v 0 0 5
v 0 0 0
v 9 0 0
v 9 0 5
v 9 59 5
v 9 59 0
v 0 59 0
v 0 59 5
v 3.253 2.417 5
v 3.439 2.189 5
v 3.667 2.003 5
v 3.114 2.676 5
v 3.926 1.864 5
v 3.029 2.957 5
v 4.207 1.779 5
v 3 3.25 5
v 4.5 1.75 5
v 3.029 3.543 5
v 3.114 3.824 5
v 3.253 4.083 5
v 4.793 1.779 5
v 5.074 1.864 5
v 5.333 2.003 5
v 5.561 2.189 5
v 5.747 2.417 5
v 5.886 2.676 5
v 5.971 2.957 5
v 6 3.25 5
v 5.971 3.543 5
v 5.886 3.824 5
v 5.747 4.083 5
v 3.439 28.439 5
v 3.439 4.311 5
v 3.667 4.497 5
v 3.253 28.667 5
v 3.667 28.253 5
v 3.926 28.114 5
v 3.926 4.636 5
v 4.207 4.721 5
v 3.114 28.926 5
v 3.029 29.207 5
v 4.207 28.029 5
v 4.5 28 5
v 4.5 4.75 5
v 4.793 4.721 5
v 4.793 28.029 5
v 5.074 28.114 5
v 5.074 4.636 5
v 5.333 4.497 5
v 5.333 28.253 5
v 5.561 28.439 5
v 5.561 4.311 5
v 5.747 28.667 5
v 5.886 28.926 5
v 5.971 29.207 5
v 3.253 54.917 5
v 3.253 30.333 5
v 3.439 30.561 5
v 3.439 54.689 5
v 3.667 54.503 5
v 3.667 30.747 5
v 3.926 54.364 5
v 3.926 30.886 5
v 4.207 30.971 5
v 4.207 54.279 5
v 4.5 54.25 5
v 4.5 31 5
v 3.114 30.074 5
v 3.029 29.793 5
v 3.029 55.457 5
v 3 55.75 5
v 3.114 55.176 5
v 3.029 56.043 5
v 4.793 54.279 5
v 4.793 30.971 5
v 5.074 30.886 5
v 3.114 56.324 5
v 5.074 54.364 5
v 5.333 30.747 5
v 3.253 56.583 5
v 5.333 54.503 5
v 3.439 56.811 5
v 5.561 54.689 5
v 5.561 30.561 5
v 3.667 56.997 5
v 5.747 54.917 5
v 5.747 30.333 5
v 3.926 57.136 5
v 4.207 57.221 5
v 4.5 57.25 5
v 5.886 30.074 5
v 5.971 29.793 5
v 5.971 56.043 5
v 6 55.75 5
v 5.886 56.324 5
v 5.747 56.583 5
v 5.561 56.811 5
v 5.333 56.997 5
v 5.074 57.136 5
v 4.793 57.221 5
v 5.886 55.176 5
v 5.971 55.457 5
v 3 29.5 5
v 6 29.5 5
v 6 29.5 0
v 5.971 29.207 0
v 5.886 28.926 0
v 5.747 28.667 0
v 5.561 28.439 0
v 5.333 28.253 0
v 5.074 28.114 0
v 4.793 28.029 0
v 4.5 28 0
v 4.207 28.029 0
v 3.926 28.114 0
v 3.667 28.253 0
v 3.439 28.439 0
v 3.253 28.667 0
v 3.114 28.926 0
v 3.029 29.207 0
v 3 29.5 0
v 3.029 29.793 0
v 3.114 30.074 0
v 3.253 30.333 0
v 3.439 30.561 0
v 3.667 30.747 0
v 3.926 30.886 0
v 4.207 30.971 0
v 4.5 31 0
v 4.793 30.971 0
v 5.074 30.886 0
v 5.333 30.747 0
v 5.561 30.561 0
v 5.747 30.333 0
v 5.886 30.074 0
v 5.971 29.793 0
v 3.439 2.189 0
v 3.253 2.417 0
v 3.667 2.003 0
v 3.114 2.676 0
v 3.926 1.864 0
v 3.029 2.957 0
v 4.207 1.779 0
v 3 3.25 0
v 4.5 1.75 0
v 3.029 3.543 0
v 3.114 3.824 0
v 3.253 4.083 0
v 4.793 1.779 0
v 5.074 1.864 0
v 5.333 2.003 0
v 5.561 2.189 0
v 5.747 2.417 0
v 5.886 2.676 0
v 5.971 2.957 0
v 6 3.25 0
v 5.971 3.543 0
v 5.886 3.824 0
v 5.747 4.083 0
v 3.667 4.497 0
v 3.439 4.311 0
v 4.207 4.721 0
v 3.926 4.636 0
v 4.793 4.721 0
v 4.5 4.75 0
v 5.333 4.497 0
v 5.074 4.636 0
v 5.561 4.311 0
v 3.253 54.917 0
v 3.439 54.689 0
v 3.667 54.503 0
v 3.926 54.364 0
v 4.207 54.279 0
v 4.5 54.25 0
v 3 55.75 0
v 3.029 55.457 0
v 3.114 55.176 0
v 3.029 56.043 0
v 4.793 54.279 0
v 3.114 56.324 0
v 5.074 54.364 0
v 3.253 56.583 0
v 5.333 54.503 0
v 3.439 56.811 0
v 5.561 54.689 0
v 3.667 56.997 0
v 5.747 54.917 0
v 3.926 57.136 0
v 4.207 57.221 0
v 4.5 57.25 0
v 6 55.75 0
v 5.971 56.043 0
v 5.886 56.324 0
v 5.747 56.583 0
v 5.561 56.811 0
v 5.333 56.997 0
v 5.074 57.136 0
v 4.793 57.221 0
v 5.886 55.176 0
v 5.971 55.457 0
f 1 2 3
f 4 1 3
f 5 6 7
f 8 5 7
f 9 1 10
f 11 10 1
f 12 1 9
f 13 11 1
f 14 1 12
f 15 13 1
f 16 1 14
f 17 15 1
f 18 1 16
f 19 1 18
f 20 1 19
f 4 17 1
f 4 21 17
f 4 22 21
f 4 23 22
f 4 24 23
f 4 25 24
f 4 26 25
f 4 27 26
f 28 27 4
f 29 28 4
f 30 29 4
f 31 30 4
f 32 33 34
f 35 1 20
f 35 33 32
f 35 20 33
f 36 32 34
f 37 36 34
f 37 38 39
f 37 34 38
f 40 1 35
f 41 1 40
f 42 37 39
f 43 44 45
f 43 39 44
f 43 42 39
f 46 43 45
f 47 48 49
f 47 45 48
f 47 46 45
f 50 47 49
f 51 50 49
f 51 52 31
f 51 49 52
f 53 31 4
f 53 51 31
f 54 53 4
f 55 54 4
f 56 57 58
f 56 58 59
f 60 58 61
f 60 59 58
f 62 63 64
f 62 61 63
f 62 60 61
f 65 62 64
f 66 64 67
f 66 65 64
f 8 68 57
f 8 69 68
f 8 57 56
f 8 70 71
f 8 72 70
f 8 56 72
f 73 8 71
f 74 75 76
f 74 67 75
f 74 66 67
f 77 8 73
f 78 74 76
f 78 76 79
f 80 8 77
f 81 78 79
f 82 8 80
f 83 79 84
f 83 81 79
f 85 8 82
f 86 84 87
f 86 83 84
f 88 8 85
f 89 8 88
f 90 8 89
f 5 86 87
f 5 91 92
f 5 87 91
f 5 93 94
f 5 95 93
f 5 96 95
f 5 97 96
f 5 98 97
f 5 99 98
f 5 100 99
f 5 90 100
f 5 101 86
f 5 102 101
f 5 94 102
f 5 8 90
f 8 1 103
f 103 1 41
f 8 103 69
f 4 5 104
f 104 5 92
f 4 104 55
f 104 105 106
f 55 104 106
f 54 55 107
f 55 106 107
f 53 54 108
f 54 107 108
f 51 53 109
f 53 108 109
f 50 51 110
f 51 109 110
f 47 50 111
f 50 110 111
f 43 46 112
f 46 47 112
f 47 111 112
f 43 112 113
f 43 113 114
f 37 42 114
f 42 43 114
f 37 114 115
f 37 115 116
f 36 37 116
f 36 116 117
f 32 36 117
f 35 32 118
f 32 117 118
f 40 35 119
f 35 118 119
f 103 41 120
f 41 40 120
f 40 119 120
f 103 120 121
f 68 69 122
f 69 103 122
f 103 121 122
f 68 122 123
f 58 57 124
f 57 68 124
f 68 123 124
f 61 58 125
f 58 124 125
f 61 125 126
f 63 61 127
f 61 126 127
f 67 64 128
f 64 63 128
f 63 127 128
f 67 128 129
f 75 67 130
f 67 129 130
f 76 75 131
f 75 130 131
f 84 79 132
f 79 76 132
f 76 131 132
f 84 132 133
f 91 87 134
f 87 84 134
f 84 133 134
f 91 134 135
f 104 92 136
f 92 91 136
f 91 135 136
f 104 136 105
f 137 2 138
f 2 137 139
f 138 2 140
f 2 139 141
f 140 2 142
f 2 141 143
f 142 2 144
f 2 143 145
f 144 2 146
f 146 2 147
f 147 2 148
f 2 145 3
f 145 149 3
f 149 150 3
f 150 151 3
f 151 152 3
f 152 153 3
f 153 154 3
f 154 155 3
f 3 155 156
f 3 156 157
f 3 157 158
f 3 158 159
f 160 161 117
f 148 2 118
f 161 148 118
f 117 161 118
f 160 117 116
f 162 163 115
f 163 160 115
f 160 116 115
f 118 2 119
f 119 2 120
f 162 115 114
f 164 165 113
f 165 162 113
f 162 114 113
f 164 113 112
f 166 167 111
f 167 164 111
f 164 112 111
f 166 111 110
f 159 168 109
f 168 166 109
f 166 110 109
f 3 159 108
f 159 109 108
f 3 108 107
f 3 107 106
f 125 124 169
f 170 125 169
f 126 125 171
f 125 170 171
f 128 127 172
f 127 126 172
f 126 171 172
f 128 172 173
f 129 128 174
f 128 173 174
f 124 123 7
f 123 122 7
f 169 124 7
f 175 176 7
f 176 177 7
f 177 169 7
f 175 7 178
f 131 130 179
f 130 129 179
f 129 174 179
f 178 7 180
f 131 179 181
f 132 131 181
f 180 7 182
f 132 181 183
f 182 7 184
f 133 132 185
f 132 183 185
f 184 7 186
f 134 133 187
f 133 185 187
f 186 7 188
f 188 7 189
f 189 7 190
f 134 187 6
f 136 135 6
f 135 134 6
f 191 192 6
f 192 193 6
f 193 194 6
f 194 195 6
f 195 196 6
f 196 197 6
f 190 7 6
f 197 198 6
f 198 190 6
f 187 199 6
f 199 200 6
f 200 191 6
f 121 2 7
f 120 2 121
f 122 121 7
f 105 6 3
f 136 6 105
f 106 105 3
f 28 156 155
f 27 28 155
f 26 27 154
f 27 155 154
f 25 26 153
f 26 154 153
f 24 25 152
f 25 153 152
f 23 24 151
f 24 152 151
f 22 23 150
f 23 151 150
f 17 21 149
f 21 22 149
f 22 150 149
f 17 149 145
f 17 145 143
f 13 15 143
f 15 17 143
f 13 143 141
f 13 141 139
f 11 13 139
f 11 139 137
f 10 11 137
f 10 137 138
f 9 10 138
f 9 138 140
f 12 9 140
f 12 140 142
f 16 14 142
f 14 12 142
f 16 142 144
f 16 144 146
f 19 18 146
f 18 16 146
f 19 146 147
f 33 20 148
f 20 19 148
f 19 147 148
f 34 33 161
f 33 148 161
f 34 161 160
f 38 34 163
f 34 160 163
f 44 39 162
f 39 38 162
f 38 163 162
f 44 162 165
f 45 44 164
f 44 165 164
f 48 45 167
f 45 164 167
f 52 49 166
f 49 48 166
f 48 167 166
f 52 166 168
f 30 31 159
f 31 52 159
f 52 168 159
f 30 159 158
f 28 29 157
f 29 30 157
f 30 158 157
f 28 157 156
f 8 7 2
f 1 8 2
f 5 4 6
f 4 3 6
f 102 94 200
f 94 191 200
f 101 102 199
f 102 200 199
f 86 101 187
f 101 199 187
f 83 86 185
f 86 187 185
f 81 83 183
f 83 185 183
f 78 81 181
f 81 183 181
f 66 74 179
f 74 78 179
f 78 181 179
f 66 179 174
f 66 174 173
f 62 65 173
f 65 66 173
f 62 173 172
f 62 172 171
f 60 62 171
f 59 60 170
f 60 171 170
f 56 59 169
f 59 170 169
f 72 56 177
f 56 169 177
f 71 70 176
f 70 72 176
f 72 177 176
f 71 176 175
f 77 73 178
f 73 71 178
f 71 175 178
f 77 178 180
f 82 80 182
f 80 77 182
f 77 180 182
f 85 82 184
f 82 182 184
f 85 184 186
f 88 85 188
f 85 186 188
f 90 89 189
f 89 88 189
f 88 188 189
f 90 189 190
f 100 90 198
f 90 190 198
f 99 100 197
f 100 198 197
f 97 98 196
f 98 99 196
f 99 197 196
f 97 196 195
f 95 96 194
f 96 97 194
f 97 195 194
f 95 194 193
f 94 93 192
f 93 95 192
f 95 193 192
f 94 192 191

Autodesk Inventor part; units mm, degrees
ref_plane "YZ Plane" through (0, 0, 0) normal (1, 0, 0) x (0, 1, 0)
ref_plane "XZ Plane" through (0, 0, 0) normal (0, 1, 0) x (-1, 0, 0)
ref_plane "XY Plane" through (0, 0, 0) normal (0, 0, 1) x (1, 0, 0)
sketch "Sketch1" plane through (0, 0, 0) normal (0, 0, 1) x (1, 0, 0)
  line L0 (0, 0) -> (9, 0)
  line L1 (9, 0) -> (9, 59)
  line L2 (9, 59) -> (0, 59)
  line L3 (0, 59) -> (0, 0)
  circle A0 centre (4.5, 55.75) radius 1.5
  circle A1 centre (4.5, 3.25) radius 1.5
  line L4 (4.5, 55.75) -> (4.5, 3.25) construction
  circle A2 centre (4.5, 29.5) radius 1.5
  point P0 (9, 29.5)
  point P1 (4.5, 59)
  dimension "d0" = 9
  dimension "d1" = 59
  dimension "d2" = 3
  dimension "d3" = 3
  dimension "d4" = 52.5
  dimension "d5" = 3
extrude "Extrusion1" add sketch "Sketch1" along normal blind 5
properties part number "SJ017" material "ABS Plastic"
